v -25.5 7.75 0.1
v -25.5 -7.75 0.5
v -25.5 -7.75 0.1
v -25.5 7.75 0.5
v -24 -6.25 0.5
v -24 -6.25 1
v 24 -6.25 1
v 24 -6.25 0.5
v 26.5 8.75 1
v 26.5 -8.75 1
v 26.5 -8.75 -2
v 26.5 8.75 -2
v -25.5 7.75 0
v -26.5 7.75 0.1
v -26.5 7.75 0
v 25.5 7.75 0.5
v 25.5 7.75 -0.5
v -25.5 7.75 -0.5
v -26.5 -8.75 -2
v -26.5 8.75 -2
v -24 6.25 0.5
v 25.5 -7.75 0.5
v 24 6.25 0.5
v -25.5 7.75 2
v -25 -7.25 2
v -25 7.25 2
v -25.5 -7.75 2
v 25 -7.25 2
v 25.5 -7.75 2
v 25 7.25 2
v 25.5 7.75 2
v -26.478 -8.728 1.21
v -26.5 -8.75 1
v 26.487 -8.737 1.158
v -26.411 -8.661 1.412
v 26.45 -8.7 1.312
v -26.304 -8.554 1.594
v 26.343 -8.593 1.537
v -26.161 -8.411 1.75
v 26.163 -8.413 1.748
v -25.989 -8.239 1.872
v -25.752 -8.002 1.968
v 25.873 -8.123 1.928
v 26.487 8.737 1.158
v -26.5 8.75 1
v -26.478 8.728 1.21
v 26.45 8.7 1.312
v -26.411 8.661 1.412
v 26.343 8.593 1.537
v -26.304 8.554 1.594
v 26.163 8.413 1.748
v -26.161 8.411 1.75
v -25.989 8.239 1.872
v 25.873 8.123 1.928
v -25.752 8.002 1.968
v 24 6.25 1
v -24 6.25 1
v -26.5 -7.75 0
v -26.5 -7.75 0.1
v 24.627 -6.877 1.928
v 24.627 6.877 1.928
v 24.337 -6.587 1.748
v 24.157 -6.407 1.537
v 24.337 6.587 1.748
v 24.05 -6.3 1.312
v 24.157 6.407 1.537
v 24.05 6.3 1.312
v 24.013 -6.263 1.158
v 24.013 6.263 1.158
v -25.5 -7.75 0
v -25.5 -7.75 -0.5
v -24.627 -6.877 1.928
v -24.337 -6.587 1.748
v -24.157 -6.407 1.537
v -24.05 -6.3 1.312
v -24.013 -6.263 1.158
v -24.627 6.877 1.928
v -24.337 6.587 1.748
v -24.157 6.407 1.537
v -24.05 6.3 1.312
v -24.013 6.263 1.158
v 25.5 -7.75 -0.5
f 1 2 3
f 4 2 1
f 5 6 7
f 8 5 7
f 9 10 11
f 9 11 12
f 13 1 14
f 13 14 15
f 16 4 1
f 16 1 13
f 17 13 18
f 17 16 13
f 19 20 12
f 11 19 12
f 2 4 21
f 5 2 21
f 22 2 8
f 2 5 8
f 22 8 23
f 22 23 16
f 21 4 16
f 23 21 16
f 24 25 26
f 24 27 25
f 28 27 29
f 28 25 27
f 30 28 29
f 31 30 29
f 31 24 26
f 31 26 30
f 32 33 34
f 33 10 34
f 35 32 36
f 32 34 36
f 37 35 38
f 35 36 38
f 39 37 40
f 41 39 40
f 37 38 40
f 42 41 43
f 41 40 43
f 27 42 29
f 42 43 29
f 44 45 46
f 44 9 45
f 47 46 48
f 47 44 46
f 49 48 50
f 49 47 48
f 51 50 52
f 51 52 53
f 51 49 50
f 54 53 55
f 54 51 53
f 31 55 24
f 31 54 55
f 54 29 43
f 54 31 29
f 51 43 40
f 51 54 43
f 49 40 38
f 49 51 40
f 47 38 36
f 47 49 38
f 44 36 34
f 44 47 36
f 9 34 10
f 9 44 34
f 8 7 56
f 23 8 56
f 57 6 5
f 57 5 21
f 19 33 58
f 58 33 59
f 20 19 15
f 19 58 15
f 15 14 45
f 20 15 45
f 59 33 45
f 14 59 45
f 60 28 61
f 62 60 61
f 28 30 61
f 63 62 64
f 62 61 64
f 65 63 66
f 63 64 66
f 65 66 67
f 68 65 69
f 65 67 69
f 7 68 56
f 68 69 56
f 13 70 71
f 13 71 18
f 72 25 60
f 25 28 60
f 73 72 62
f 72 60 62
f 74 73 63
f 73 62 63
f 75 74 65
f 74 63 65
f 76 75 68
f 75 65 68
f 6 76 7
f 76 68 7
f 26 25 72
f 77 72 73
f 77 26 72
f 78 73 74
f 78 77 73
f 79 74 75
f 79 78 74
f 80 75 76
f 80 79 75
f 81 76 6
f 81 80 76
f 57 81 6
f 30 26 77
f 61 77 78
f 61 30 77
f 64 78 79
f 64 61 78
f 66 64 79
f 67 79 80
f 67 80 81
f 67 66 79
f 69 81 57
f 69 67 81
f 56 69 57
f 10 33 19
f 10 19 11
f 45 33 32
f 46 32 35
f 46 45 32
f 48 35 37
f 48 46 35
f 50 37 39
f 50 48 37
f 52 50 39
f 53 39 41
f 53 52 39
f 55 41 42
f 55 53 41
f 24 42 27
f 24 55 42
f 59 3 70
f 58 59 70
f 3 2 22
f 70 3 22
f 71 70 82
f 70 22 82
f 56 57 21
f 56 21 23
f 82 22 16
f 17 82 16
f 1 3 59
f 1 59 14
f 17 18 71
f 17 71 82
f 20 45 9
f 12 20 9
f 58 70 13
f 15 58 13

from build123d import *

# Parameters (mm, degrees)
SKETCH_1_W          = 53
SKETCH_1_H          = 17.5
EXTRUDE_1_DEPTH     = 2
SKETCH_3_W          = 51
SKETCH_3_H          = 15.5
CUT_EXTRUDE_2_DEPTH = 0.5
SKETCH_2_W          = 48
SKETCH_2_H          = 12.5
CUT_EXTRUDE_3_DEPTH = 2
FILLET_1_R          = 1
SKETCH_5_W          = 0.1
SKETCH_5_H          = 15.5
CUT_EXTRUDE_5_DEPTH = 28.978786607


with BuildPart() as part:
    # Эскиз1 → Бобышка-Вытянуть1 (new, symmetric)
    with BuildSketch(Plane.XY):
        Rectangle(SKETCH_1_W, SKETCH_1_H)
    extrude(amount=EXTRUDE_1_DEPTH, both=True)

    # Эскиз3 → Вырез-Вытянуть2 (cut, symmetric)
    with BuildSketch(Plane.XY):
        Rectangle(SKETCH_3_W, SKETCH_3_H)
    extrude(amount=CUT_EXTRUDE_2_DEPTH, both=True, mode=Mode.SUBTRACT)

    # Эскиз2 → Вырез-Вытянуть3 (cut)
    with BuildSketch(Plane.XY.offset(2)):
        Rectangle(SKETCH_2_W, SKETCH_2_H)
    extrude(amount=-CUT_EXTRUDE_3_DEPTH, mode=Mode.SUBTRACT)

    # Скругление1
    fillet_1_edges = [part.edges().sort_by_distance(p)[0] for p in [
        (26.5, 0, 2),
        (0, 8.75, 2),
        (-24, 0, 2),
        (0, -6.25, 2),
        (24, 0, 2),
        (0, 6.25, 2),
        (-26.5, 0, 2),
        (0, -8.75, 2),
    ]]
    fillet(fillet_1_edges, radius=FILLET_1_R)

    # Эскиз5 → Вырез-Вытянуть5 (cut, through all)
    with BuildSketch(Plane(origin=(0, 0, 0), x_dir=(0, 0, -1), z_dir=(1, 0, 0))):
        with Locations((-0.05, 0)):
            Rectangle(SKETCH_5_W, SKETCH_5_H)
    extrude(amount=-CUT_EXTRUDE_5_DEPTH, mode=Mode.SUBTRACT)


solid = part.part
